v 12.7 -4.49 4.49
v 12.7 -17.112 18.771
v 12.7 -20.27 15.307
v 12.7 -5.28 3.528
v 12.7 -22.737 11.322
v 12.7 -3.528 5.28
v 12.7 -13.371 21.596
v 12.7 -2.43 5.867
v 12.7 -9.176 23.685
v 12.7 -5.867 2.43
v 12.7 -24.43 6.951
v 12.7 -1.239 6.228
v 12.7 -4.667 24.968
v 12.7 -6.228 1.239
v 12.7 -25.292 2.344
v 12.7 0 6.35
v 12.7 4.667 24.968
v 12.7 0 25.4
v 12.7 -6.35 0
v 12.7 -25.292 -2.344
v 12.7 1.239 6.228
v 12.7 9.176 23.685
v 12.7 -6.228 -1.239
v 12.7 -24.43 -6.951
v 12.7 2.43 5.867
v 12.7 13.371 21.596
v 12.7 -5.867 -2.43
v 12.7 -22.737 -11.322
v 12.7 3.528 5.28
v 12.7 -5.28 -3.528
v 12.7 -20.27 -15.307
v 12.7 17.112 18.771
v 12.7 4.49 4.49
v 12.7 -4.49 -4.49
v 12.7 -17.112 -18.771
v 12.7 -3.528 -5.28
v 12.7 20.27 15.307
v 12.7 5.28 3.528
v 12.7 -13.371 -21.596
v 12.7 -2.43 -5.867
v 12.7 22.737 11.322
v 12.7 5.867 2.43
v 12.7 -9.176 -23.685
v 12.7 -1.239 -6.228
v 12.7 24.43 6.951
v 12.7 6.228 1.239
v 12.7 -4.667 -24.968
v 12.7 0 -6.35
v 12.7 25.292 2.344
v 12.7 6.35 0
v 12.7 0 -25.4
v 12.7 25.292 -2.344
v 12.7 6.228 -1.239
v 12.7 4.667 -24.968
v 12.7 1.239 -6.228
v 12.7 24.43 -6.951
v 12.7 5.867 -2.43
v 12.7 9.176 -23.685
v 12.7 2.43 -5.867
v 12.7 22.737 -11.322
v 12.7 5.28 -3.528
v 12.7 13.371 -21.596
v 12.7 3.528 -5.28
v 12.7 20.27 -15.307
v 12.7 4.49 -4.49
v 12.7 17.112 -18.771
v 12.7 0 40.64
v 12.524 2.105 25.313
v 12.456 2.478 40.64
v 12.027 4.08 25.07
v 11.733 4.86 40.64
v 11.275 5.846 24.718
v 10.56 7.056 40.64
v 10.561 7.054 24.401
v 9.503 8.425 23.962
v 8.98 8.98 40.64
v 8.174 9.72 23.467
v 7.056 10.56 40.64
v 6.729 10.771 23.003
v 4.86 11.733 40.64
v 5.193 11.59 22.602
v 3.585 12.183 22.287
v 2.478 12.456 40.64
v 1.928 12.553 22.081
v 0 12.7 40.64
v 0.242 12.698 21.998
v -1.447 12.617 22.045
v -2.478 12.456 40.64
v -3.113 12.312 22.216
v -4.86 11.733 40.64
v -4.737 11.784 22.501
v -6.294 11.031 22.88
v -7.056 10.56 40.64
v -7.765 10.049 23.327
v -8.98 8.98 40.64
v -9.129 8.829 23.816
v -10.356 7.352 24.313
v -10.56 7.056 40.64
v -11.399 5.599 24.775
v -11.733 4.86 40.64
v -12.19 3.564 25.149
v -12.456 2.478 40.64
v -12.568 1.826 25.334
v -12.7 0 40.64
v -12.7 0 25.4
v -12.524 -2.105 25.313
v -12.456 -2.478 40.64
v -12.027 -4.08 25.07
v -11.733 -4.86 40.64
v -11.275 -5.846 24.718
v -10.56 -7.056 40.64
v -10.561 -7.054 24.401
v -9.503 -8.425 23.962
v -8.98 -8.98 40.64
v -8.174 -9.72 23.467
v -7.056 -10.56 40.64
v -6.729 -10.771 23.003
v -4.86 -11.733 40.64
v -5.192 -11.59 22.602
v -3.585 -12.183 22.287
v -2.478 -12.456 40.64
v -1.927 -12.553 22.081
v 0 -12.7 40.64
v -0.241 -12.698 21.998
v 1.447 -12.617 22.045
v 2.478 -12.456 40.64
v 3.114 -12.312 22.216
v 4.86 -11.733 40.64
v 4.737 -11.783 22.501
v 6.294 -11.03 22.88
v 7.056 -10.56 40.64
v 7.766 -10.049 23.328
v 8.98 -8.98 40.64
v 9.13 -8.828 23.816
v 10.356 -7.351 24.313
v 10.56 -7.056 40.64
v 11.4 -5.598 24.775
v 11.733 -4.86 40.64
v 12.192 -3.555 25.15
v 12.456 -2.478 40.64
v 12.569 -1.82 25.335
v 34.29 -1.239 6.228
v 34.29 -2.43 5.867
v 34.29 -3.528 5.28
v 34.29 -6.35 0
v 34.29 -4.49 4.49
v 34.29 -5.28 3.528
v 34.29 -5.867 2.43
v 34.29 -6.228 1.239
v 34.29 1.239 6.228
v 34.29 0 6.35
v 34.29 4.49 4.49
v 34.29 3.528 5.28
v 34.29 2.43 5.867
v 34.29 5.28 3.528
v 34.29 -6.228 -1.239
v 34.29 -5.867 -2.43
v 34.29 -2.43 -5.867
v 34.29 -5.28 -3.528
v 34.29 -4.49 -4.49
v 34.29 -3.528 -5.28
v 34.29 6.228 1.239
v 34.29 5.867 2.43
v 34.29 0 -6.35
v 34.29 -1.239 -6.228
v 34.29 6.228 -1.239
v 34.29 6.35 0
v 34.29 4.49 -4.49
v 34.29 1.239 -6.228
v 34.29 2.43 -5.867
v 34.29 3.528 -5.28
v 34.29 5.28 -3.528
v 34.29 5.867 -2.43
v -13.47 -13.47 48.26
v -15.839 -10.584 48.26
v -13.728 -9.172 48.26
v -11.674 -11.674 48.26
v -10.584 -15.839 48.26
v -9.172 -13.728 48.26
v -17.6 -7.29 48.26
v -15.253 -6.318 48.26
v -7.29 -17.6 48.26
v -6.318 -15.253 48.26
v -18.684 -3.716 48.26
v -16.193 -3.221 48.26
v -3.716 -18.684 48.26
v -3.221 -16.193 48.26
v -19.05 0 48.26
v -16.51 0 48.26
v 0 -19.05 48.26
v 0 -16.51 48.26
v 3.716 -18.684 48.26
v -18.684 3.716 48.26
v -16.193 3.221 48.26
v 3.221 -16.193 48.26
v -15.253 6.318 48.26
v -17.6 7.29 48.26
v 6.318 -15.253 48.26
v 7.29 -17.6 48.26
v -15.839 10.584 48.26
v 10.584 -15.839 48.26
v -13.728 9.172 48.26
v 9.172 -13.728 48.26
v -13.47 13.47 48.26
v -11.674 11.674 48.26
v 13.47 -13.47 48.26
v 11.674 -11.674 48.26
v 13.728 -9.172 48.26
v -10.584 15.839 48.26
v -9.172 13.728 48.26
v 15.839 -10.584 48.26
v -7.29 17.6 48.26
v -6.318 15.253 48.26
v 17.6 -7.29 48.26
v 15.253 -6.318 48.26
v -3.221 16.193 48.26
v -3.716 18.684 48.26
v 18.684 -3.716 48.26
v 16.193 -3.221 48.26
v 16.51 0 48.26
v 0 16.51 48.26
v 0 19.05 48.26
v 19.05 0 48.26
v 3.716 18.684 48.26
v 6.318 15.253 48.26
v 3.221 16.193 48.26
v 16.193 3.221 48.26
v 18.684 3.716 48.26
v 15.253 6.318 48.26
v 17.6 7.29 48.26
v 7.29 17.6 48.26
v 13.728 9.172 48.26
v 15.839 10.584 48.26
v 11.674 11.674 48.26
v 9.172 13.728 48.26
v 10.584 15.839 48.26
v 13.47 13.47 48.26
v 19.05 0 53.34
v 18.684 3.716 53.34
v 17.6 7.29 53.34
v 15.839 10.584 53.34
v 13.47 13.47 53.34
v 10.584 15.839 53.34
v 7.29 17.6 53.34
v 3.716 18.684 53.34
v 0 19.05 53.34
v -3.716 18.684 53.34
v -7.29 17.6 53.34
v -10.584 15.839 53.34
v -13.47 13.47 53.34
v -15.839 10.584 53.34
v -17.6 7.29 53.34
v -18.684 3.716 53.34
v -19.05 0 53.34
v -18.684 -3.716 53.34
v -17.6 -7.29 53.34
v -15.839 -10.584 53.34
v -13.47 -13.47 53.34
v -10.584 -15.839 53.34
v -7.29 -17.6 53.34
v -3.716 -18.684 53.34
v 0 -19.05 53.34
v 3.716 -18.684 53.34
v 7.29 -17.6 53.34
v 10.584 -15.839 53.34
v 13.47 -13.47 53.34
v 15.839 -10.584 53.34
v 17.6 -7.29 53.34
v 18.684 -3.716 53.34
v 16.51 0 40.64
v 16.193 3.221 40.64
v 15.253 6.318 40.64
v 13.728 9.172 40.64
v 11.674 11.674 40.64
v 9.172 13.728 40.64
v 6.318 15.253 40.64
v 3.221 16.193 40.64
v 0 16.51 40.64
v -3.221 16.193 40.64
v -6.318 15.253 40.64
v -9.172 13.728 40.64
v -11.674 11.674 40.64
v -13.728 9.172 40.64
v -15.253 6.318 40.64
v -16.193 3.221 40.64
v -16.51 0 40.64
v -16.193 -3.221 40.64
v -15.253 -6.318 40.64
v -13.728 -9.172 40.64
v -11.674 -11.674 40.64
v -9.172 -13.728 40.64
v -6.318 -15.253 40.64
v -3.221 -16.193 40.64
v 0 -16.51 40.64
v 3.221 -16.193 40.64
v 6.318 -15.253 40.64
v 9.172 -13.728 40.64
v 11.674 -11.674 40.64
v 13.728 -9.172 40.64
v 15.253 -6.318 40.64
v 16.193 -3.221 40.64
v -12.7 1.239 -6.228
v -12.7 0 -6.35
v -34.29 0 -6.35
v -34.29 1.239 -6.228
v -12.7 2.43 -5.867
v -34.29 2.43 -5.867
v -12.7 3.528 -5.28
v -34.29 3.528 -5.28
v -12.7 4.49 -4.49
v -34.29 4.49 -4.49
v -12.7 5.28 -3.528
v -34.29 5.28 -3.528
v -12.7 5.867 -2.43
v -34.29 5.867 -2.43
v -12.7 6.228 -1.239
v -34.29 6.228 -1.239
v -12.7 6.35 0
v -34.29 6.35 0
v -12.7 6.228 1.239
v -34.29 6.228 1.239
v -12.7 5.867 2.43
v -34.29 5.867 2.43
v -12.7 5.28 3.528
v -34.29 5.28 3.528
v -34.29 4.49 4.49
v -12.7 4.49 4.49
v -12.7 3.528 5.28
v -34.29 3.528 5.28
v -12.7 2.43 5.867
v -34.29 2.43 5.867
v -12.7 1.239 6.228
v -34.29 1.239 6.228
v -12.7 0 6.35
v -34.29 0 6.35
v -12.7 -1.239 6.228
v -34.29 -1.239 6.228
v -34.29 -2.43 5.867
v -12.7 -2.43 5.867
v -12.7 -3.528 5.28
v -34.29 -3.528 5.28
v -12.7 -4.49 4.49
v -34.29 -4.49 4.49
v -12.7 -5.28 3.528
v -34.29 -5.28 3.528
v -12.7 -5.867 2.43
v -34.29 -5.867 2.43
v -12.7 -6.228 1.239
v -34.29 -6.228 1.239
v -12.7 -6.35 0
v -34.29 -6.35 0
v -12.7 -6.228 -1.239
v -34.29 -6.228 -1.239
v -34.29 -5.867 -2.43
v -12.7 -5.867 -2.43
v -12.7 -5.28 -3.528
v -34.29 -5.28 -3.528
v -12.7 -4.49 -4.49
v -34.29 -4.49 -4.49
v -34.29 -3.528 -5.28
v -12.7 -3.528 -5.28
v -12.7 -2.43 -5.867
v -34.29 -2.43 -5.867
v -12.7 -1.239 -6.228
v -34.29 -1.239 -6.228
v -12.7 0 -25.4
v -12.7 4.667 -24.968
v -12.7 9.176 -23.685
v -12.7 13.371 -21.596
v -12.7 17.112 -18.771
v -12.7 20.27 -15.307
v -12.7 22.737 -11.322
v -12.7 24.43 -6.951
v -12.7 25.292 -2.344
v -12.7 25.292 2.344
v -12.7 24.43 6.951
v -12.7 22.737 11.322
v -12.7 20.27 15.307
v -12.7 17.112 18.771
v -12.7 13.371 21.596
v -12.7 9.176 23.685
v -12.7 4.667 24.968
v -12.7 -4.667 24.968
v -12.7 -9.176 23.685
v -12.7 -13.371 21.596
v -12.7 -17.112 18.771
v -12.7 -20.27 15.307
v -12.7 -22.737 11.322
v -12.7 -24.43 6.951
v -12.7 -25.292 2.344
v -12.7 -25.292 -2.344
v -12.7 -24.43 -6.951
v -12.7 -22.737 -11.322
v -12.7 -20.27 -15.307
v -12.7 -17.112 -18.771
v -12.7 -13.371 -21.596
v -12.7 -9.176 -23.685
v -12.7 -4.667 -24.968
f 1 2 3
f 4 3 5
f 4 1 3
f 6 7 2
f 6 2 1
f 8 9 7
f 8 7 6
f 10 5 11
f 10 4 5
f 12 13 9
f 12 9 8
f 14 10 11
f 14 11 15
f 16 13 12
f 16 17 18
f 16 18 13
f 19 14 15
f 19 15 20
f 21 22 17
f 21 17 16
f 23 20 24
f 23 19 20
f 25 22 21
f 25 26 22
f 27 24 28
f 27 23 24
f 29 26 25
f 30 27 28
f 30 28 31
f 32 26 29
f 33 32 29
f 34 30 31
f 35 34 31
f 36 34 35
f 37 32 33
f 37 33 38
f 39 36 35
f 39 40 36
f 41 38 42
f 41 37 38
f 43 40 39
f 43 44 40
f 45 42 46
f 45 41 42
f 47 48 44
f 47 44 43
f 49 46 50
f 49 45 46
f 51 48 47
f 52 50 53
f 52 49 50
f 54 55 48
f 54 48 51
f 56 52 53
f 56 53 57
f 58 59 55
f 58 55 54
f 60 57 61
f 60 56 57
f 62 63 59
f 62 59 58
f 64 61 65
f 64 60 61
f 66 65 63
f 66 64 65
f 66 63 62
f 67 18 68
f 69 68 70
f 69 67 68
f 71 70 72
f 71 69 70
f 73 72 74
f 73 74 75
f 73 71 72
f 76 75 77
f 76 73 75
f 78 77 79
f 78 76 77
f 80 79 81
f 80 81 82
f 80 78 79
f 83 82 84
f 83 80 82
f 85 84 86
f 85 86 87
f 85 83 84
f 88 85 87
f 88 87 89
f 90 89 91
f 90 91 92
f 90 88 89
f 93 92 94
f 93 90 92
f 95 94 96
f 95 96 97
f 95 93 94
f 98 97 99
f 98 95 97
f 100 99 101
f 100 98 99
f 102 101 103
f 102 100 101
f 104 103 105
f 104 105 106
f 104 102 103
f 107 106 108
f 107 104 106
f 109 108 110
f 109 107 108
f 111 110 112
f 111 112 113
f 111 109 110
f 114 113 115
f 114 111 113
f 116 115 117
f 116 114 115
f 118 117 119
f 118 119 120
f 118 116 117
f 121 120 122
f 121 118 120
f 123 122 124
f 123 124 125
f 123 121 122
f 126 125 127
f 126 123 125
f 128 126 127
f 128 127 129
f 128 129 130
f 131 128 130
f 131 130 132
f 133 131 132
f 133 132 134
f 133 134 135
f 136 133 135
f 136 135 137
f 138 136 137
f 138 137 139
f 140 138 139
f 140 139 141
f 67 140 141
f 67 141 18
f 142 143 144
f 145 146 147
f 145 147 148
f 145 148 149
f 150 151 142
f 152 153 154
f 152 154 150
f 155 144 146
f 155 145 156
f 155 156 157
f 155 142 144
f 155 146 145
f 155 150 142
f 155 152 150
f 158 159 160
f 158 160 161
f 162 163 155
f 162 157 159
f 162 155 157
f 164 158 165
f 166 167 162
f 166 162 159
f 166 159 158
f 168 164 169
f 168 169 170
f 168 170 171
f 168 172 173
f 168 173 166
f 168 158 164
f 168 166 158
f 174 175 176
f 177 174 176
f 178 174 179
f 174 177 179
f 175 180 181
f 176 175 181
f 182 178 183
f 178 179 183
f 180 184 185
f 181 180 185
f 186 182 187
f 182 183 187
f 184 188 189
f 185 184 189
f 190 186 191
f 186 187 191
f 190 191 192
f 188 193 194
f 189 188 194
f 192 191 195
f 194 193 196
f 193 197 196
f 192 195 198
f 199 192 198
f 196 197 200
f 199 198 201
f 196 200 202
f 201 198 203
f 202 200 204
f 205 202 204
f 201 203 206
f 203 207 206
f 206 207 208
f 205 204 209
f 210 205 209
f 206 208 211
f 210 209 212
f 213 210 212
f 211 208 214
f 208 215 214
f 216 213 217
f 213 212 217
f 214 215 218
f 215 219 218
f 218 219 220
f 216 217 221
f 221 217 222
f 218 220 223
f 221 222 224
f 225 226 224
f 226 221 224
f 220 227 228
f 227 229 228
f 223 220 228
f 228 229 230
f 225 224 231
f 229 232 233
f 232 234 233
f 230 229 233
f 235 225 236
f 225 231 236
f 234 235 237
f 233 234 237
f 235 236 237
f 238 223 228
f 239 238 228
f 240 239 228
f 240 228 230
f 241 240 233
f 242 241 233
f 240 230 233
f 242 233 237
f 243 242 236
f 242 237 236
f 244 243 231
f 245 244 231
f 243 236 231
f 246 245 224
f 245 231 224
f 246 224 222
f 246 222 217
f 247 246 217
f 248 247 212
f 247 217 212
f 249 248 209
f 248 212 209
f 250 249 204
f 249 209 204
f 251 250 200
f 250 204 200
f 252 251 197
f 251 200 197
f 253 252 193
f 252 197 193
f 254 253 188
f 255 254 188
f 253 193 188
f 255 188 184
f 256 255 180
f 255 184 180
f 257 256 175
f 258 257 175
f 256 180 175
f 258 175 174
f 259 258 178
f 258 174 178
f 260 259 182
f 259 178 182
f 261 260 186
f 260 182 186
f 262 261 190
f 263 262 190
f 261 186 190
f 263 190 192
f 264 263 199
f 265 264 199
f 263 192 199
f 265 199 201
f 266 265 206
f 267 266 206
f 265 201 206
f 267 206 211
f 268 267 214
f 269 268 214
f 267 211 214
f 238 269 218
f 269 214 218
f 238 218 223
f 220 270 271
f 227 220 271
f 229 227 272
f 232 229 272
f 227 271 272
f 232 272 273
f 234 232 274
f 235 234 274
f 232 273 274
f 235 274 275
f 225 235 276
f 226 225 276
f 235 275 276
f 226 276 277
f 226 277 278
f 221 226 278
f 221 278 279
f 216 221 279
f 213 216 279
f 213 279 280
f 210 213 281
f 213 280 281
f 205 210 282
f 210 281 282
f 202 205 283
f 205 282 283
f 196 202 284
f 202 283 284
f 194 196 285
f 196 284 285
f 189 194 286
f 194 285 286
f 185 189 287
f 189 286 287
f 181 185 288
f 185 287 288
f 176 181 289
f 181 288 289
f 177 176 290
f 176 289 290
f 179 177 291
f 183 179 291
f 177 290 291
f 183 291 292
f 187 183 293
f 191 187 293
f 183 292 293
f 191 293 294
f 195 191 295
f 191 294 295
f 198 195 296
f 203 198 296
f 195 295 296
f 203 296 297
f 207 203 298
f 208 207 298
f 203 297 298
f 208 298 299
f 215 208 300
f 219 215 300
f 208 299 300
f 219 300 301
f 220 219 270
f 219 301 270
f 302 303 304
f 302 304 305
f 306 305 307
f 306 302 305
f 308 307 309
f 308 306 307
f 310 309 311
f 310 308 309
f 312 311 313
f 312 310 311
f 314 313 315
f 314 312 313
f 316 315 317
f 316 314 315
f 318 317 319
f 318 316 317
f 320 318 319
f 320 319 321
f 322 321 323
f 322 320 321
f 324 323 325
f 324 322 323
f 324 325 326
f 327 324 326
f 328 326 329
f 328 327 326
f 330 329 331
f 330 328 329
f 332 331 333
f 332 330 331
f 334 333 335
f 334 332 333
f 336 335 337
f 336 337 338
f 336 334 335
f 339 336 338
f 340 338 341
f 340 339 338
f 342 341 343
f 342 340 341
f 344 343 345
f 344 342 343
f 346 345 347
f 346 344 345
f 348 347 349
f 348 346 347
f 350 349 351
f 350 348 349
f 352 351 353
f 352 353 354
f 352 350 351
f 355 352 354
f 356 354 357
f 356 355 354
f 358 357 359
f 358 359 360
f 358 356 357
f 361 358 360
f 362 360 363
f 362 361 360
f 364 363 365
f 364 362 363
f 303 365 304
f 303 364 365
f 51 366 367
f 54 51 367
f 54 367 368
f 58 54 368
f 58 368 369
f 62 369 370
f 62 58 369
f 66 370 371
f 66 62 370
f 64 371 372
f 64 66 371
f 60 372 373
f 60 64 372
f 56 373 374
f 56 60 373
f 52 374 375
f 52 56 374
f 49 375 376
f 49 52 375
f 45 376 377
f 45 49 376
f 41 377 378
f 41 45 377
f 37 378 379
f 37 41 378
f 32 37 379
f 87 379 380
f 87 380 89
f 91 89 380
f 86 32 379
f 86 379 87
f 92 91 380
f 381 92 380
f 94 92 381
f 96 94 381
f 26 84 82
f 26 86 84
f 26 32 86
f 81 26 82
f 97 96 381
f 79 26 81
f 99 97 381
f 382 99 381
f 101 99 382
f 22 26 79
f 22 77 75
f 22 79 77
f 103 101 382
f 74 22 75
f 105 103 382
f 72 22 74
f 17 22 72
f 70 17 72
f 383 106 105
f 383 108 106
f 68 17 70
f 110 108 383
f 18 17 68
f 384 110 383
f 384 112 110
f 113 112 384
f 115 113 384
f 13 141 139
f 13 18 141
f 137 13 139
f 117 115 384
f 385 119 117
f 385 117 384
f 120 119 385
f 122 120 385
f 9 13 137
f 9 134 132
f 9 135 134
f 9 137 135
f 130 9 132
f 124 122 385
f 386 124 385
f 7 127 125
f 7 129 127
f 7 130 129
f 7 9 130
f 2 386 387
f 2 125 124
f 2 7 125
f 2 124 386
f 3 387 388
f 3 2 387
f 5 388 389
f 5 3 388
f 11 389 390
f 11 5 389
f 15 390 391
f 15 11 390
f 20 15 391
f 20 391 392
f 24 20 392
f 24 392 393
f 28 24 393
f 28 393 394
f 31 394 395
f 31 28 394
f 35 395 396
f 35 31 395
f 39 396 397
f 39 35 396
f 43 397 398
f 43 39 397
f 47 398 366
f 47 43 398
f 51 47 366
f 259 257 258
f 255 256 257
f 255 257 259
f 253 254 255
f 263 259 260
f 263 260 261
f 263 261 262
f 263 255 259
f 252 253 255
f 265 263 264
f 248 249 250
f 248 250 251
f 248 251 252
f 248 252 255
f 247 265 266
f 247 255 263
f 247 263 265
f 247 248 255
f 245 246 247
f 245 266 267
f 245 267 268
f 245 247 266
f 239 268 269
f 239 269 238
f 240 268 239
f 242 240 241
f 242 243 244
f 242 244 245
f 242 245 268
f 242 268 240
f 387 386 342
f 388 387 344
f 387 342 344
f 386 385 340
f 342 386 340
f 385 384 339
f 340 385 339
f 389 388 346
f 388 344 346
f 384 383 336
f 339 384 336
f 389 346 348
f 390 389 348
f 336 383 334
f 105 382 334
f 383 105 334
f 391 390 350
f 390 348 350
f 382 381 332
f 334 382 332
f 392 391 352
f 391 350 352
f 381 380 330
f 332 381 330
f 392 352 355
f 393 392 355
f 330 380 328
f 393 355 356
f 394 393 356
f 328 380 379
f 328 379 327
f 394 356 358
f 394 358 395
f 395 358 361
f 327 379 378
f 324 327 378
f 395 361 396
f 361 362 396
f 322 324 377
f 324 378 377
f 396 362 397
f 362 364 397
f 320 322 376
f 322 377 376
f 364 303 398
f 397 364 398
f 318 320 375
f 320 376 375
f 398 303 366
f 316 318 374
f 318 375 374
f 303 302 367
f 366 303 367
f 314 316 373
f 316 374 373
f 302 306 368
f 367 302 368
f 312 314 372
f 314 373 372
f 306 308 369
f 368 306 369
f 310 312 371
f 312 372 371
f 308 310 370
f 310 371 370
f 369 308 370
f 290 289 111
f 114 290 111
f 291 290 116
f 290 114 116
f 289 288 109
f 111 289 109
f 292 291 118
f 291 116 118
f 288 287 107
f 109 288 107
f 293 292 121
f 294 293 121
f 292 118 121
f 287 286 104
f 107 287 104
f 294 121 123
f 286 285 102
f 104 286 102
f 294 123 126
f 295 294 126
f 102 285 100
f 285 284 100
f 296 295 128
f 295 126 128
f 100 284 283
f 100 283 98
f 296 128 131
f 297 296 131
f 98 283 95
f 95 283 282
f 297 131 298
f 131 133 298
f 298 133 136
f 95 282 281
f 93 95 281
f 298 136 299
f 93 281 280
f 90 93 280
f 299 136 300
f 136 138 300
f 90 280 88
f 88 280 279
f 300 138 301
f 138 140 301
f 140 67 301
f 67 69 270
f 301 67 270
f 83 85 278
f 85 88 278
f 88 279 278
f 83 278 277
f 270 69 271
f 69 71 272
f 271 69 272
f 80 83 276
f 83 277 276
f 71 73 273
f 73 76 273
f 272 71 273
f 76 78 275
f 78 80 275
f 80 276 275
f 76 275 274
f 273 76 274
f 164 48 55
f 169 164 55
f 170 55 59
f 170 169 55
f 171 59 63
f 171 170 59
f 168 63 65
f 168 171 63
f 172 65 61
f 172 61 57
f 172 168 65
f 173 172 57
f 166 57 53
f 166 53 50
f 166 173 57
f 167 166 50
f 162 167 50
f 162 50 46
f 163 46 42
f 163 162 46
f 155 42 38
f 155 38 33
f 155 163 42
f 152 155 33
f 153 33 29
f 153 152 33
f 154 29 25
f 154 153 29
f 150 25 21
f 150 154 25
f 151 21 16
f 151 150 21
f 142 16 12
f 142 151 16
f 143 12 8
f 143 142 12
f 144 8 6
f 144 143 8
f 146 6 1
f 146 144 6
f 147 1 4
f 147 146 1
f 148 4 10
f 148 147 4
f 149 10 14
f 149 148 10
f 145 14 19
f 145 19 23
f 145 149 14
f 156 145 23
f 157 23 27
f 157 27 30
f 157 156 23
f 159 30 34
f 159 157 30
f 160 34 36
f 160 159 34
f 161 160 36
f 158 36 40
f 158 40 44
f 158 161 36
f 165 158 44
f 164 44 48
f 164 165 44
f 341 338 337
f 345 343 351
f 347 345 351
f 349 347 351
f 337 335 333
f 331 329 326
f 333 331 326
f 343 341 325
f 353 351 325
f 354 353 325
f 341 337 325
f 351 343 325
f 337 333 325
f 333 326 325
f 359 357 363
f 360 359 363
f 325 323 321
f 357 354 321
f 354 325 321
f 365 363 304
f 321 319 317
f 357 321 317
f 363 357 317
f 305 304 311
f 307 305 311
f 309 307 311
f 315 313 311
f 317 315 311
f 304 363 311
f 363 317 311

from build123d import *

# Parameters (mm, degrees)
CROQUIS1_R              = 25.4
SALIENTE_EXTRUIR1_DEPTH = 12.7
SALIENTE_EXTRUIR2_REACH = 68.04
CROQUIS2_R              = 12.7
CROQUIS3_R              = 16.51
SALIENTE_EXTRUIR3_DEPTH = 7.62
CROQUIS4_R              = 19.05
SALIENTE_EXTRUIR4_DEPTH = 5.08
CROQUIS6_R              = 6.35
SALIENTE_EXTRUIR5_DEPTH = 34.29


with BuildPart() as part:
    # Croquis1 → Saliente-Extruir1 (new body, symmetric)
    with BuildSketch(Plane(origin=(0, 0, 0), x_dir=(0, 0, -1), z_dir=(1, 0, 0))):
        Circle(CROQUIS1_R)
    extrude(amount=SALIENTE_EXTRUIR1_DEPTH, both=True)

    # Croquis2 → Saliente-Extruir2 (add, up to next)
    with BuildSketch(Plane.XY.offset(40.64), mode=Mode.PRIVATE) as saliente_extruir2_sk1:
        Circle(CROQUIS2_R)
    saliente_extruir2_tool1 = extrude(saliente_extruir2_sk1.sketch, amount=-SALIENTE_EXTRUIR2_REACH, mode=Mode.PRIVATE) - part.part
    add(saliente_extruir2_tool1.solids().sort_by_distance((0, 0, 40.64))[0])

    # Croquis3 → Saliente-Extruir3 (add)
    with BuildSketch(Plane.XY.offset(40.64)):
        Circle(CROQUIS3_R)
    extrude(amount=SALIENTE_EXTRUIR3_DEPTH)

    # Croquis4 → Saliente-Extruir4 (add)
    with BuildSketch(Plane.XY.offset(48.26)):
        Circle(CROQUIS4_R)
    extrude(amount=SALIENTE_EXTRUIR4_DEPTH)

    # Croquis6 → Saliente-Extruir5 (add, symmetric)
    with BuildSketch(Plane(origin=(0, 0, 0), x_dir=(0, 0, -1), z_dir=(1, 0, 0))):
        Circle(CROQUIS6_R)
    extrude(amount=SALIENTE_EXTRUIR5_DEPTH, both=True)


solid = part.part
